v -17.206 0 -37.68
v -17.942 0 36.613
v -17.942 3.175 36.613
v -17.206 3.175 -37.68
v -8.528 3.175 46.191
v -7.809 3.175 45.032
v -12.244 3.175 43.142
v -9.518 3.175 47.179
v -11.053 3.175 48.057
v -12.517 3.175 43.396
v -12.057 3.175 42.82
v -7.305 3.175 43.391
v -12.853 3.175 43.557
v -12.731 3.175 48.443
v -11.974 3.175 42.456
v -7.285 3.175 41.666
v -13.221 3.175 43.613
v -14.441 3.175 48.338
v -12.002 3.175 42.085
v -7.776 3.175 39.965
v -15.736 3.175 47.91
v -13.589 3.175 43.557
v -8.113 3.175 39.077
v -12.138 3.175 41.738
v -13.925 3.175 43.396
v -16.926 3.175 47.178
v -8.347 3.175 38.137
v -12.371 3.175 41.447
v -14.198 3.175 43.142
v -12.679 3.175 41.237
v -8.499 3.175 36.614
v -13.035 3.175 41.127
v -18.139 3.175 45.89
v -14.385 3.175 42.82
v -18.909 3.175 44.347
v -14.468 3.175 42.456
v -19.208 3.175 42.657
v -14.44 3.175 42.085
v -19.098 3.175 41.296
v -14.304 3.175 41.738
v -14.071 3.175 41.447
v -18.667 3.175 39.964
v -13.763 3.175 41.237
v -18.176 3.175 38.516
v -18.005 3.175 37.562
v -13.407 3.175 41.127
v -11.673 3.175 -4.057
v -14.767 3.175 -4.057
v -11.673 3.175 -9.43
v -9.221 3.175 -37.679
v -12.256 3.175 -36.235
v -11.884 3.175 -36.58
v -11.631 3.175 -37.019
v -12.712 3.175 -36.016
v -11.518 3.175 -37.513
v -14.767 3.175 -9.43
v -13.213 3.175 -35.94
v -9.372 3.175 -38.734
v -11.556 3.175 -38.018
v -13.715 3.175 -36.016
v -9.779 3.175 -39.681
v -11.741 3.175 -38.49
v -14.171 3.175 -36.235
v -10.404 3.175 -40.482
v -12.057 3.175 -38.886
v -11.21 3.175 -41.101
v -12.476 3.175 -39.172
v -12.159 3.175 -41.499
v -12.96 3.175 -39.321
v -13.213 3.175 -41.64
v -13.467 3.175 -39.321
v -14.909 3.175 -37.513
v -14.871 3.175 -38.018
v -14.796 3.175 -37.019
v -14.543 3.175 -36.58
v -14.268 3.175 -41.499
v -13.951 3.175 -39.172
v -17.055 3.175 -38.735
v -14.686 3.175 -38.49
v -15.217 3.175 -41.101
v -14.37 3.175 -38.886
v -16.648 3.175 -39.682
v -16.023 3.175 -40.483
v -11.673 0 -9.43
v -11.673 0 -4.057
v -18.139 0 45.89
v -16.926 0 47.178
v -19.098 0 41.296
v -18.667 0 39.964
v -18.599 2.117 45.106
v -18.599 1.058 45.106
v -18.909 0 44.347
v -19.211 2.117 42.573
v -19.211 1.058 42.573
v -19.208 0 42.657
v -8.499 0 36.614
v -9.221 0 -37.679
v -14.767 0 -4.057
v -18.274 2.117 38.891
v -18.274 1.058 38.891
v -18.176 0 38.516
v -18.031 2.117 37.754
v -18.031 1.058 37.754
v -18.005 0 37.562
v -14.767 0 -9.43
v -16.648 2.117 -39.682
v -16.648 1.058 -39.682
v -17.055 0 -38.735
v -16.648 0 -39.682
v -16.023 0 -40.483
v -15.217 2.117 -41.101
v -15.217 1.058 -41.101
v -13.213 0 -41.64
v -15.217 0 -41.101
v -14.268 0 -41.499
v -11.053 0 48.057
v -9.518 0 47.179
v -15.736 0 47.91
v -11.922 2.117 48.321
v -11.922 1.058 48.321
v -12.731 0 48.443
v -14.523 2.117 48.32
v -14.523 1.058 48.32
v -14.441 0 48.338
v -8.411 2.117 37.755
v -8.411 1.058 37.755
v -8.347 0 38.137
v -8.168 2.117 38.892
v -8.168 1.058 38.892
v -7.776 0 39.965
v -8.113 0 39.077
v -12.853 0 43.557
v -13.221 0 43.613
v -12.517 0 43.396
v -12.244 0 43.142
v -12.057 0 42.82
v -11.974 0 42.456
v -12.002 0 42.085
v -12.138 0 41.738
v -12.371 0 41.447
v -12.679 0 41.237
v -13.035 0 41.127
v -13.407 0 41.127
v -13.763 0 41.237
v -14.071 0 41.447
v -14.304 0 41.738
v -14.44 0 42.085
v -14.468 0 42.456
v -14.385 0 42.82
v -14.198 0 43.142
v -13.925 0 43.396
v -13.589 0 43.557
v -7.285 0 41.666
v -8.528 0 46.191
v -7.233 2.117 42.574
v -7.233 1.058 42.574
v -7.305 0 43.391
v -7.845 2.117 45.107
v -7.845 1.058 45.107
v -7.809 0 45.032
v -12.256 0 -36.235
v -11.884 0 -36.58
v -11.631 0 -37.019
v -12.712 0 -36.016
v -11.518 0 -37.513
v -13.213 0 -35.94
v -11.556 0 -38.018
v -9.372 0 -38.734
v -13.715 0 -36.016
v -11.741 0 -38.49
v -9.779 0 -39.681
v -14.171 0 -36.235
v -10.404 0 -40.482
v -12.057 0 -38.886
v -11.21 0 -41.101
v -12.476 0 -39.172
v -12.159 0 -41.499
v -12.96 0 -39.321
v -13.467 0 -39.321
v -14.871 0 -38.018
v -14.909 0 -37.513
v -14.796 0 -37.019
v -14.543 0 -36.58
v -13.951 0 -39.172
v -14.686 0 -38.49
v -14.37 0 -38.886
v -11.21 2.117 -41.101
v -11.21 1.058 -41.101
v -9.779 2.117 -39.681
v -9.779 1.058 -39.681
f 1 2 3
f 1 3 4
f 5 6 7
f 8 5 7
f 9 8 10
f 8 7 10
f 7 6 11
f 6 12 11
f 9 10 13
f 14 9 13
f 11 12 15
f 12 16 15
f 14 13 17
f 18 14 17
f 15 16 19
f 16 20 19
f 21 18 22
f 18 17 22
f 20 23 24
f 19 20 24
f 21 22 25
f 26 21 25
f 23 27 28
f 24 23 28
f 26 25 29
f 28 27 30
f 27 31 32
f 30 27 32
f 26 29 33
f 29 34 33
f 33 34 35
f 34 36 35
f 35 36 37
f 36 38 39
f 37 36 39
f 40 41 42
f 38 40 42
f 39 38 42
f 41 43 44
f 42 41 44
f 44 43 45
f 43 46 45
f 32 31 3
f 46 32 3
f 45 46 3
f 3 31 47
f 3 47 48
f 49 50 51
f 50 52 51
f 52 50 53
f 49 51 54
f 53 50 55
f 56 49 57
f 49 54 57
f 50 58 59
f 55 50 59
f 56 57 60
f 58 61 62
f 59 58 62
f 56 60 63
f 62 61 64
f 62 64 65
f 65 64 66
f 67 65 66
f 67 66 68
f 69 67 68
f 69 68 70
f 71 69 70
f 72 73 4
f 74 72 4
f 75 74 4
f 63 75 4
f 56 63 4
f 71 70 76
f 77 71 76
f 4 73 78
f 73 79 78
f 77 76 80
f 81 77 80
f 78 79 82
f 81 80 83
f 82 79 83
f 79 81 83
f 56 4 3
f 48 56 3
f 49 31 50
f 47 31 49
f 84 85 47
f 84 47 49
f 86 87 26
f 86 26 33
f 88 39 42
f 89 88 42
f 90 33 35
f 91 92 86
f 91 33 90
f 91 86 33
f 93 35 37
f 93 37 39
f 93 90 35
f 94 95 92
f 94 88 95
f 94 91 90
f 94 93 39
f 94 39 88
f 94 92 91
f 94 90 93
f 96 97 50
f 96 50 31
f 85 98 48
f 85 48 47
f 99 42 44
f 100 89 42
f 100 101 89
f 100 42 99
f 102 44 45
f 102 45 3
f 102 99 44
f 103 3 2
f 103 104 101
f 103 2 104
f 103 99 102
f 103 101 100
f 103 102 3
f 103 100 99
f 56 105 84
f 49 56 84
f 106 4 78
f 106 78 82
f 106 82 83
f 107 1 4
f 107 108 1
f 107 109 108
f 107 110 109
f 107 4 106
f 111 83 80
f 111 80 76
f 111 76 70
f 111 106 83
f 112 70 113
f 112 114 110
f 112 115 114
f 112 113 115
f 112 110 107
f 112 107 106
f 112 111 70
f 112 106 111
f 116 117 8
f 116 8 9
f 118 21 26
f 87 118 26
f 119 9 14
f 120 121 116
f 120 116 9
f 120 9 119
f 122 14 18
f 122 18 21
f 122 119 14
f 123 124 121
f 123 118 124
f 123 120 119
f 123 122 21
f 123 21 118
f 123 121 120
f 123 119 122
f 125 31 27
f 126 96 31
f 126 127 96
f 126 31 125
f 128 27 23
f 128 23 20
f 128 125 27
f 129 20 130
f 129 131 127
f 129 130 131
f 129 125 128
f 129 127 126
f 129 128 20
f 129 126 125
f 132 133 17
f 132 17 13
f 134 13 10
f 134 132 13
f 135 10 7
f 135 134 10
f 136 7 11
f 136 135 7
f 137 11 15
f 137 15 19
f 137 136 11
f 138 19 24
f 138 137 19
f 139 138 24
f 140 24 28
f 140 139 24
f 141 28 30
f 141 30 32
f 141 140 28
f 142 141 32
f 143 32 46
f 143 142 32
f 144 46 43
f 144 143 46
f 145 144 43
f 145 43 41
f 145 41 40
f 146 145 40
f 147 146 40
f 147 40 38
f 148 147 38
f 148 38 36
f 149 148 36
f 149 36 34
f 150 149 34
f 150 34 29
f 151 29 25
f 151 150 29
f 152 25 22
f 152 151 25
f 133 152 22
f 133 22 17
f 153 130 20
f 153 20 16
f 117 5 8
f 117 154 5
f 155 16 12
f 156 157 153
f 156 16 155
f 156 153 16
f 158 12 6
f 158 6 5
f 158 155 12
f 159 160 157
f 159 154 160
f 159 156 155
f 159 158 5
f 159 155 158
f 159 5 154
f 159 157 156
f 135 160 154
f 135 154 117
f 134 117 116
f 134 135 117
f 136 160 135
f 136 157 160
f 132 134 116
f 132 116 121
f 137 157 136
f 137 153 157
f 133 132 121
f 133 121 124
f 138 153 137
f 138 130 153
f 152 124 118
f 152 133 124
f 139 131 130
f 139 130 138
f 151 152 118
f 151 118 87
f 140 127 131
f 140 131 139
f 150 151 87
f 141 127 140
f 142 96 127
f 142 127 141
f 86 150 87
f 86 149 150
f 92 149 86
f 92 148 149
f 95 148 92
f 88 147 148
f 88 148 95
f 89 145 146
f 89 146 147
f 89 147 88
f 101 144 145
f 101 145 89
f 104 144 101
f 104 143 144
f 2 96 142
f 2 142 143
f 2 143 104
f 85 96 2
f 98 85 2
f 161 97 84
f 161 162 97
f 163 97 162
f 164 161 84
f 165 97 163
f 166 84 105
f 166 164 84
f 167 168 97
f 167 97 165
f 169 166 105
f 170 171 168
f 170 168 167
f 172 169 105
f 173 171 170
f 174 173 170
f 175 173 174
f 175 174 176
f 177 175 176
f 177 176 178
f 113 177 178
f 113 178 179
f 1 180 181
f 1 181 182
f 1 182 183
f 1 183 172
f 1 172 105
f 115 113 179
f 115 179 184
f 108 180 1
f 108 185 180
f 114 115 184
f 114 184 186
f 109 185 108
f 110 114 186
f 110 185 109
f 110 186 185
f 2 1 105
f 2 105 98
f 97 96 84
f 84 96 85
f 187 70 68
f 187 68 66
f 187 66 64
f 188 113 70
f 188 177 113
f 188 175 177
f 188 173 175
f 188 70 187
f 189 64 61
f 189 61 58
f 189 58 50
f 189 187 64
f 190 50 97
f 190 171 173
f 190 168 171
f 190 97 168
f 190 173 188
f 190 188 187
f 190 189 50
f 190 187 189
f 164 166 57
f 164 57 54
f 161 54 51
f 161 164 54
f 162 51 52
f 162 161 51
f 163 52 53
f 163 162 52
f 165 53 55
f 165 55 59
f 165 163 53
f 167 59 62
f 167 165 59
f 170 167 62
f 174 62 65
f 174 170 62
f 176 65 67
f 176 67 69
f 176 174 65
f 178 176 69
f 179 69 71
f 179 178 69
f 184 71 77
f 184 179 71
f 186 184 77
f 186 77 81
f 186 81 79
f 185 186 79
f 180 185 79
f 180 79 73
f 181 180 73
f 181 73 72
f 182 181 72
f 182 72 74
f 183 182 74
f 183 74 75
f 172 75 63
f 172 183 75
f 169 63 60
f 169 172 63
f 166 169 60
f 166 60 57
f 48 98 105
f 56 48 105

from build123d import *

# Parameters (mm, degrees)
SKETCH1_R           = 1.25
SKETCH1_R_2         = 1.7
SKETCH1_W           = 3.094140016
SKETCH1_H           = 5.373555218
BOSS_EXTRUDE1_DEPTH = 3.175


with BuildPart() as part:
    # Sketch1 → Boss-Extrude1 (new body)
    with BuildSketch(Plane(origin=(0, 0, 0), x_dir=(1, 0, 0), z_dir=(0, 1, 0))):
        with BuildLine():
            Line((-17.941505014, -36.612657571), (-17.206282158, 37.679843625))
            add(Edge.make_bspline(
                [(-17.206282158, 37.679843625), (-17.184484201, 39.873471894), (-15.40321289, 41.64043003), (-13.213298132, 41.640234704)],
                knots=[5, 5, 5, 5, 6, 6, 6, 6], degree=3))
            add(Edge.make_bspline(
                [(-13.213298132, 41.640234704), (-11.02326639, 41.639863585), (-9.242112063, 39.872749187), (-9.220957516, 37.67906232)],
                knots=[6, 6, 6, 6, 7, 7, 7, 7], degree=3))
            Line((-9.220957516, 37.67906232), (-8.499207286, -36.613556071))
            add(Edge.make_bspline(
                [(-8.499207286, -36.613556071), (-8.488347302, -37.73638763), (-8.242642606, -38.944342263), (-7.775936264, -39.965467569)],
                knots=[8, 8, 8, 8, 9, 9, 9, 9], degree=3))
            add(Edge.make_bspline(
                [(-7.775936264, -39.965467569), (-6.625031446, -42.484421072), (-7.34506592, -45.465496377), (-9.518291008, -47.178573835)],
                knots=[0, 0, 0, 0, 1, 1, 1, 1], degree=3))
            add(Edge.make_bspline(
                [(-9.518291008, -47.178573835), (-11.691730567, -48.891651292), (-14.753212643, -48.891270406), (-16.926262256, -47.177802296)],
                knots=[1, 1, 1, 1, 2, 2, 2, 2], degree=3))
            add(Edge.make_bspline(
                [(-16.926262256, -47.177802296), (-19.099292372, -45.464412317), (-19.818819916, -42.483141686), (-18.667408168, -39.96438351)],
                knots=[2, 2, 2, 2, 3, 3, 3, 3], degree=3))
            add(Edge.make_bspline(
                [(-18.667408168, -39.96438351), (-18.200701827, -38.943443763), (-17.952559971, -37.73548913), (-17.941505014, -36.612657571)],
                knots=[3, 3, 3, 3, 4, 4, 4, 4], degree=3))
        make_face()
        with Locations(Location((-13.22099956, -42.362850164, 0), (0, 0, 270))):
            Circle(SKETCH1_R, mode=Mode.SUBTRACT)
        with Locations(Location((-13.213483356, 37.640055716, 0), (0, 0, 270))):
            Circle(SKETCH1_R_2, mode=Mode.SUBTRACT)
        with Locations((-13.219946705, 6.743495147)):
            Rectangle(SKETCH1_W, SKETCH1_H, mode=Mode.SUBTRACT)
    extrude(amount=BOSS_EXTRUDE1_DEPTH)


solid = part.part
